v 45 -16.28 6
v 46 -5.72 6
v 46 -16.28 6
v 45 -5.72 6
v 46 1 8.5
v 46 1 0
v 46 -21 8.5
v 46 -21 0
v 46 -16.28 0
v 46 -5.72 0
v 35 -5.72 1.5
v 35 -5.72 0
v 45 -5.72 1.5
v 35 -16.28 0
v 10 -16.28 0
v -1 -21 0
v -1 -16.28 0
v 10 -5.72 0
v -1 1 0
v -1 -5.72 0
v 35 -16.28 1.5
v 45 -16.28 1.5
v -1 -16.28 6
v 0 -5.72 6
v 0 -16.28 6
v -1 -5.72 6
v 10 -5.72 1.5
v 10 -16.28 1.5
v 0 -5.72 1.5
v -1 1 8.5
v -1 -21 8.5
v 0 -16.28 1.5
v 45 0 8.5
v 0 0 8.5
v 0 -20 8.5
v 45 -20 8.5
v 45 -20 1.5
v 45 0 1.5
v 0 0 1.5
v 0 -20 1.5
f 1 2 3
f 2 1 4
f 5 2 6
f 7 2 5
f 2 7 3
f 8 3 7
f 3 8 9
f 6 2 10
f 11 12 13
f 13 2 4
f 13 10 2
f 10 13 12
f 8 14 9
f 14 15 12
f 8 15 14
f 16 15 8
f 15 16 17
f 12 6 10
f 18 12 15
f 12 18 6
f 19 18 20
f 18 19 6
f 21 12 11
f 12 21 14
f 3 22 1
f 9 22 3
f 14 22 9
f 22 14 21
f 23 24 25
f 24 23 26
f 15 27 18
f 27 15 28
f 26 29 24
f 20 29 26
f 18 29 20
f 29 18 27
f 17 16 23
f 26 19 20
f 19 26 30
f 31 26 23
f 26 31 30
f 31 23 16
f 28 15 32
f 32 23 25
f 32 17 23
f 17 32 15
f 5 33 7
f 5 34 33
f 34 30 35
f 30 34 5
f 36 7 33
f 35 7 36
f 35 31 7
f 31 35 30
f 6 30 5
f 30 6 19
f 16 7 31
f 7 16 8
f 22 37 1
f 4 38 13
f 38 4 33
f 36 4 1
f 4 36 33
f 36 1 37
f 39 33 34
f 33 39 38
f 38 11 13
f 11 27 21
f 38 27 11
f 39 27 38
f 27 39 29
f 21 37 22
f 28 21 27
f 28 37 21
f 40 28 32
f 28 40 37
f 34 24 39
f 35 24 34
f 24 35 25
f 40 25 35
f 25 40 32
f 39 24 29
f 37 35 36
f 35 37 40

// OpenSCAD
//!OpenSCAD
CASE_THICKNESS = 1;
CASE_THICKNESS_BOTTOM = 1.5;
CASE_THICKNESS_TOP = 1.5;
PCB_THICKNESS = 1;
CONNECTOR_HEIGHT = 6;

INNER_WIDTH = 45;
INNER_DEPTH = 20;
INNER_HEIGHT = CASE_THICKNESS_BOTTOM + PCB_THICKNESS + CONNECTOR_HEIGHT - CASE_THICKNESS_TOP;

CASE_WIDTH = INNER_WIDTH + 2*CASE_THICKNESS;
CASE_DEPTH = INNER_DEPTH + 2*CASE_THICKNESS;
CASE_HEIGHT = CASE_THICKNESS_BOTTOM + PCB_THICKNESS + CONNECTOR_HEIGHT;

CAVITY_WIDTH = INNER_WIDTH;
CAVITY_DEPTH = INNER_DEPTH;
CAVITY_HEIGHT = INNER_HEIGHT;

CUTOUT_C1_X = 40 + CASE_THICKNESS/2;
CUTOUT_C1_Y = CASE_DEPTH / 2;
CUTOUT_C1_Z = CASE_THICKNESS_BOTTOM + PCB_THICKNESS;
CUTOUT_C1_WIDTH = 10 + CASE_THICKNESS;
CUTOUT_C1_DEPTH = 4*2.54 + 2*0.2;
CUTOUT_C1_HEIGHT = CONNECTOR_HEIGHT;

CUTOUT_C2_X = 5 - CASE_THICKNESS/2;
CUTOUT_C2_Y = CASE_DEPTH / 2;
CUTOUT_C2_Z = CASE_THICKNESS_BOTTOM + PCB_THICKNESS;
CUTOUT_C2_WIDTH = 10 + CASE_THICKNESS;
CUTOUT_C2_DEPTH = 4*2.54 + 2*0.2;
CUTOUT_C2_HEIGHT = CONNECTOR_HEIGHT;
  
module box(x, y, z, w, d, h) {
  translate([x, y, z])
  linear_extrude(height = h)
  polygon(
    [
      [-w/2, -d/2],
      [+w/2, -d/2],
      [-w/2, +d/2],
      [+w/2, +d/2],
    ],
    [
      [0, 1, 3, 2],  
    ]
  );
}

module outer_shape() {
  translate([-CASE_THICKNESS, -CASE_THICKNESS, 0])
  box(CASE_WIDTH/2, CASE_DEPTH/2, 0, CASE_WIDTH, CASE_DEPTH, CASE_HEIGHT);
}

module cavity() {
  box(CAVITY_WIDTH/2, CAVITY_DEPTH/2, 0, CAVITY_WIDTH, CAVITY_DEPTH, CAVITY_HEIGHT);
}
              
module cutout_connectors() {
  box(CUTOUT_C1_X, CUTOUT_C1_Y, CUTOUT_C1_Z, CUTOUT_C1_WIDTH, CUTOUT_C1_DEPTH, CUTOUT_C1_HEIGHT);
  box(CUTOUT_C2_X, CUTOUT_C2_Y, CUTOUT_C2_Z, CUTOUT_C2_WIDTH, CUTOUT_C2_DEPTH, CUTOUT_C2_HEIGHT);
}
  
module case_base() {
    difference() {
        outer_shape();
        cavity();
        cutout_connectors();
    }
}

difference() {    
    rotate([180,0,0]) translate([0, 0, -CASE_HEIGHT])
    case_base();
}
